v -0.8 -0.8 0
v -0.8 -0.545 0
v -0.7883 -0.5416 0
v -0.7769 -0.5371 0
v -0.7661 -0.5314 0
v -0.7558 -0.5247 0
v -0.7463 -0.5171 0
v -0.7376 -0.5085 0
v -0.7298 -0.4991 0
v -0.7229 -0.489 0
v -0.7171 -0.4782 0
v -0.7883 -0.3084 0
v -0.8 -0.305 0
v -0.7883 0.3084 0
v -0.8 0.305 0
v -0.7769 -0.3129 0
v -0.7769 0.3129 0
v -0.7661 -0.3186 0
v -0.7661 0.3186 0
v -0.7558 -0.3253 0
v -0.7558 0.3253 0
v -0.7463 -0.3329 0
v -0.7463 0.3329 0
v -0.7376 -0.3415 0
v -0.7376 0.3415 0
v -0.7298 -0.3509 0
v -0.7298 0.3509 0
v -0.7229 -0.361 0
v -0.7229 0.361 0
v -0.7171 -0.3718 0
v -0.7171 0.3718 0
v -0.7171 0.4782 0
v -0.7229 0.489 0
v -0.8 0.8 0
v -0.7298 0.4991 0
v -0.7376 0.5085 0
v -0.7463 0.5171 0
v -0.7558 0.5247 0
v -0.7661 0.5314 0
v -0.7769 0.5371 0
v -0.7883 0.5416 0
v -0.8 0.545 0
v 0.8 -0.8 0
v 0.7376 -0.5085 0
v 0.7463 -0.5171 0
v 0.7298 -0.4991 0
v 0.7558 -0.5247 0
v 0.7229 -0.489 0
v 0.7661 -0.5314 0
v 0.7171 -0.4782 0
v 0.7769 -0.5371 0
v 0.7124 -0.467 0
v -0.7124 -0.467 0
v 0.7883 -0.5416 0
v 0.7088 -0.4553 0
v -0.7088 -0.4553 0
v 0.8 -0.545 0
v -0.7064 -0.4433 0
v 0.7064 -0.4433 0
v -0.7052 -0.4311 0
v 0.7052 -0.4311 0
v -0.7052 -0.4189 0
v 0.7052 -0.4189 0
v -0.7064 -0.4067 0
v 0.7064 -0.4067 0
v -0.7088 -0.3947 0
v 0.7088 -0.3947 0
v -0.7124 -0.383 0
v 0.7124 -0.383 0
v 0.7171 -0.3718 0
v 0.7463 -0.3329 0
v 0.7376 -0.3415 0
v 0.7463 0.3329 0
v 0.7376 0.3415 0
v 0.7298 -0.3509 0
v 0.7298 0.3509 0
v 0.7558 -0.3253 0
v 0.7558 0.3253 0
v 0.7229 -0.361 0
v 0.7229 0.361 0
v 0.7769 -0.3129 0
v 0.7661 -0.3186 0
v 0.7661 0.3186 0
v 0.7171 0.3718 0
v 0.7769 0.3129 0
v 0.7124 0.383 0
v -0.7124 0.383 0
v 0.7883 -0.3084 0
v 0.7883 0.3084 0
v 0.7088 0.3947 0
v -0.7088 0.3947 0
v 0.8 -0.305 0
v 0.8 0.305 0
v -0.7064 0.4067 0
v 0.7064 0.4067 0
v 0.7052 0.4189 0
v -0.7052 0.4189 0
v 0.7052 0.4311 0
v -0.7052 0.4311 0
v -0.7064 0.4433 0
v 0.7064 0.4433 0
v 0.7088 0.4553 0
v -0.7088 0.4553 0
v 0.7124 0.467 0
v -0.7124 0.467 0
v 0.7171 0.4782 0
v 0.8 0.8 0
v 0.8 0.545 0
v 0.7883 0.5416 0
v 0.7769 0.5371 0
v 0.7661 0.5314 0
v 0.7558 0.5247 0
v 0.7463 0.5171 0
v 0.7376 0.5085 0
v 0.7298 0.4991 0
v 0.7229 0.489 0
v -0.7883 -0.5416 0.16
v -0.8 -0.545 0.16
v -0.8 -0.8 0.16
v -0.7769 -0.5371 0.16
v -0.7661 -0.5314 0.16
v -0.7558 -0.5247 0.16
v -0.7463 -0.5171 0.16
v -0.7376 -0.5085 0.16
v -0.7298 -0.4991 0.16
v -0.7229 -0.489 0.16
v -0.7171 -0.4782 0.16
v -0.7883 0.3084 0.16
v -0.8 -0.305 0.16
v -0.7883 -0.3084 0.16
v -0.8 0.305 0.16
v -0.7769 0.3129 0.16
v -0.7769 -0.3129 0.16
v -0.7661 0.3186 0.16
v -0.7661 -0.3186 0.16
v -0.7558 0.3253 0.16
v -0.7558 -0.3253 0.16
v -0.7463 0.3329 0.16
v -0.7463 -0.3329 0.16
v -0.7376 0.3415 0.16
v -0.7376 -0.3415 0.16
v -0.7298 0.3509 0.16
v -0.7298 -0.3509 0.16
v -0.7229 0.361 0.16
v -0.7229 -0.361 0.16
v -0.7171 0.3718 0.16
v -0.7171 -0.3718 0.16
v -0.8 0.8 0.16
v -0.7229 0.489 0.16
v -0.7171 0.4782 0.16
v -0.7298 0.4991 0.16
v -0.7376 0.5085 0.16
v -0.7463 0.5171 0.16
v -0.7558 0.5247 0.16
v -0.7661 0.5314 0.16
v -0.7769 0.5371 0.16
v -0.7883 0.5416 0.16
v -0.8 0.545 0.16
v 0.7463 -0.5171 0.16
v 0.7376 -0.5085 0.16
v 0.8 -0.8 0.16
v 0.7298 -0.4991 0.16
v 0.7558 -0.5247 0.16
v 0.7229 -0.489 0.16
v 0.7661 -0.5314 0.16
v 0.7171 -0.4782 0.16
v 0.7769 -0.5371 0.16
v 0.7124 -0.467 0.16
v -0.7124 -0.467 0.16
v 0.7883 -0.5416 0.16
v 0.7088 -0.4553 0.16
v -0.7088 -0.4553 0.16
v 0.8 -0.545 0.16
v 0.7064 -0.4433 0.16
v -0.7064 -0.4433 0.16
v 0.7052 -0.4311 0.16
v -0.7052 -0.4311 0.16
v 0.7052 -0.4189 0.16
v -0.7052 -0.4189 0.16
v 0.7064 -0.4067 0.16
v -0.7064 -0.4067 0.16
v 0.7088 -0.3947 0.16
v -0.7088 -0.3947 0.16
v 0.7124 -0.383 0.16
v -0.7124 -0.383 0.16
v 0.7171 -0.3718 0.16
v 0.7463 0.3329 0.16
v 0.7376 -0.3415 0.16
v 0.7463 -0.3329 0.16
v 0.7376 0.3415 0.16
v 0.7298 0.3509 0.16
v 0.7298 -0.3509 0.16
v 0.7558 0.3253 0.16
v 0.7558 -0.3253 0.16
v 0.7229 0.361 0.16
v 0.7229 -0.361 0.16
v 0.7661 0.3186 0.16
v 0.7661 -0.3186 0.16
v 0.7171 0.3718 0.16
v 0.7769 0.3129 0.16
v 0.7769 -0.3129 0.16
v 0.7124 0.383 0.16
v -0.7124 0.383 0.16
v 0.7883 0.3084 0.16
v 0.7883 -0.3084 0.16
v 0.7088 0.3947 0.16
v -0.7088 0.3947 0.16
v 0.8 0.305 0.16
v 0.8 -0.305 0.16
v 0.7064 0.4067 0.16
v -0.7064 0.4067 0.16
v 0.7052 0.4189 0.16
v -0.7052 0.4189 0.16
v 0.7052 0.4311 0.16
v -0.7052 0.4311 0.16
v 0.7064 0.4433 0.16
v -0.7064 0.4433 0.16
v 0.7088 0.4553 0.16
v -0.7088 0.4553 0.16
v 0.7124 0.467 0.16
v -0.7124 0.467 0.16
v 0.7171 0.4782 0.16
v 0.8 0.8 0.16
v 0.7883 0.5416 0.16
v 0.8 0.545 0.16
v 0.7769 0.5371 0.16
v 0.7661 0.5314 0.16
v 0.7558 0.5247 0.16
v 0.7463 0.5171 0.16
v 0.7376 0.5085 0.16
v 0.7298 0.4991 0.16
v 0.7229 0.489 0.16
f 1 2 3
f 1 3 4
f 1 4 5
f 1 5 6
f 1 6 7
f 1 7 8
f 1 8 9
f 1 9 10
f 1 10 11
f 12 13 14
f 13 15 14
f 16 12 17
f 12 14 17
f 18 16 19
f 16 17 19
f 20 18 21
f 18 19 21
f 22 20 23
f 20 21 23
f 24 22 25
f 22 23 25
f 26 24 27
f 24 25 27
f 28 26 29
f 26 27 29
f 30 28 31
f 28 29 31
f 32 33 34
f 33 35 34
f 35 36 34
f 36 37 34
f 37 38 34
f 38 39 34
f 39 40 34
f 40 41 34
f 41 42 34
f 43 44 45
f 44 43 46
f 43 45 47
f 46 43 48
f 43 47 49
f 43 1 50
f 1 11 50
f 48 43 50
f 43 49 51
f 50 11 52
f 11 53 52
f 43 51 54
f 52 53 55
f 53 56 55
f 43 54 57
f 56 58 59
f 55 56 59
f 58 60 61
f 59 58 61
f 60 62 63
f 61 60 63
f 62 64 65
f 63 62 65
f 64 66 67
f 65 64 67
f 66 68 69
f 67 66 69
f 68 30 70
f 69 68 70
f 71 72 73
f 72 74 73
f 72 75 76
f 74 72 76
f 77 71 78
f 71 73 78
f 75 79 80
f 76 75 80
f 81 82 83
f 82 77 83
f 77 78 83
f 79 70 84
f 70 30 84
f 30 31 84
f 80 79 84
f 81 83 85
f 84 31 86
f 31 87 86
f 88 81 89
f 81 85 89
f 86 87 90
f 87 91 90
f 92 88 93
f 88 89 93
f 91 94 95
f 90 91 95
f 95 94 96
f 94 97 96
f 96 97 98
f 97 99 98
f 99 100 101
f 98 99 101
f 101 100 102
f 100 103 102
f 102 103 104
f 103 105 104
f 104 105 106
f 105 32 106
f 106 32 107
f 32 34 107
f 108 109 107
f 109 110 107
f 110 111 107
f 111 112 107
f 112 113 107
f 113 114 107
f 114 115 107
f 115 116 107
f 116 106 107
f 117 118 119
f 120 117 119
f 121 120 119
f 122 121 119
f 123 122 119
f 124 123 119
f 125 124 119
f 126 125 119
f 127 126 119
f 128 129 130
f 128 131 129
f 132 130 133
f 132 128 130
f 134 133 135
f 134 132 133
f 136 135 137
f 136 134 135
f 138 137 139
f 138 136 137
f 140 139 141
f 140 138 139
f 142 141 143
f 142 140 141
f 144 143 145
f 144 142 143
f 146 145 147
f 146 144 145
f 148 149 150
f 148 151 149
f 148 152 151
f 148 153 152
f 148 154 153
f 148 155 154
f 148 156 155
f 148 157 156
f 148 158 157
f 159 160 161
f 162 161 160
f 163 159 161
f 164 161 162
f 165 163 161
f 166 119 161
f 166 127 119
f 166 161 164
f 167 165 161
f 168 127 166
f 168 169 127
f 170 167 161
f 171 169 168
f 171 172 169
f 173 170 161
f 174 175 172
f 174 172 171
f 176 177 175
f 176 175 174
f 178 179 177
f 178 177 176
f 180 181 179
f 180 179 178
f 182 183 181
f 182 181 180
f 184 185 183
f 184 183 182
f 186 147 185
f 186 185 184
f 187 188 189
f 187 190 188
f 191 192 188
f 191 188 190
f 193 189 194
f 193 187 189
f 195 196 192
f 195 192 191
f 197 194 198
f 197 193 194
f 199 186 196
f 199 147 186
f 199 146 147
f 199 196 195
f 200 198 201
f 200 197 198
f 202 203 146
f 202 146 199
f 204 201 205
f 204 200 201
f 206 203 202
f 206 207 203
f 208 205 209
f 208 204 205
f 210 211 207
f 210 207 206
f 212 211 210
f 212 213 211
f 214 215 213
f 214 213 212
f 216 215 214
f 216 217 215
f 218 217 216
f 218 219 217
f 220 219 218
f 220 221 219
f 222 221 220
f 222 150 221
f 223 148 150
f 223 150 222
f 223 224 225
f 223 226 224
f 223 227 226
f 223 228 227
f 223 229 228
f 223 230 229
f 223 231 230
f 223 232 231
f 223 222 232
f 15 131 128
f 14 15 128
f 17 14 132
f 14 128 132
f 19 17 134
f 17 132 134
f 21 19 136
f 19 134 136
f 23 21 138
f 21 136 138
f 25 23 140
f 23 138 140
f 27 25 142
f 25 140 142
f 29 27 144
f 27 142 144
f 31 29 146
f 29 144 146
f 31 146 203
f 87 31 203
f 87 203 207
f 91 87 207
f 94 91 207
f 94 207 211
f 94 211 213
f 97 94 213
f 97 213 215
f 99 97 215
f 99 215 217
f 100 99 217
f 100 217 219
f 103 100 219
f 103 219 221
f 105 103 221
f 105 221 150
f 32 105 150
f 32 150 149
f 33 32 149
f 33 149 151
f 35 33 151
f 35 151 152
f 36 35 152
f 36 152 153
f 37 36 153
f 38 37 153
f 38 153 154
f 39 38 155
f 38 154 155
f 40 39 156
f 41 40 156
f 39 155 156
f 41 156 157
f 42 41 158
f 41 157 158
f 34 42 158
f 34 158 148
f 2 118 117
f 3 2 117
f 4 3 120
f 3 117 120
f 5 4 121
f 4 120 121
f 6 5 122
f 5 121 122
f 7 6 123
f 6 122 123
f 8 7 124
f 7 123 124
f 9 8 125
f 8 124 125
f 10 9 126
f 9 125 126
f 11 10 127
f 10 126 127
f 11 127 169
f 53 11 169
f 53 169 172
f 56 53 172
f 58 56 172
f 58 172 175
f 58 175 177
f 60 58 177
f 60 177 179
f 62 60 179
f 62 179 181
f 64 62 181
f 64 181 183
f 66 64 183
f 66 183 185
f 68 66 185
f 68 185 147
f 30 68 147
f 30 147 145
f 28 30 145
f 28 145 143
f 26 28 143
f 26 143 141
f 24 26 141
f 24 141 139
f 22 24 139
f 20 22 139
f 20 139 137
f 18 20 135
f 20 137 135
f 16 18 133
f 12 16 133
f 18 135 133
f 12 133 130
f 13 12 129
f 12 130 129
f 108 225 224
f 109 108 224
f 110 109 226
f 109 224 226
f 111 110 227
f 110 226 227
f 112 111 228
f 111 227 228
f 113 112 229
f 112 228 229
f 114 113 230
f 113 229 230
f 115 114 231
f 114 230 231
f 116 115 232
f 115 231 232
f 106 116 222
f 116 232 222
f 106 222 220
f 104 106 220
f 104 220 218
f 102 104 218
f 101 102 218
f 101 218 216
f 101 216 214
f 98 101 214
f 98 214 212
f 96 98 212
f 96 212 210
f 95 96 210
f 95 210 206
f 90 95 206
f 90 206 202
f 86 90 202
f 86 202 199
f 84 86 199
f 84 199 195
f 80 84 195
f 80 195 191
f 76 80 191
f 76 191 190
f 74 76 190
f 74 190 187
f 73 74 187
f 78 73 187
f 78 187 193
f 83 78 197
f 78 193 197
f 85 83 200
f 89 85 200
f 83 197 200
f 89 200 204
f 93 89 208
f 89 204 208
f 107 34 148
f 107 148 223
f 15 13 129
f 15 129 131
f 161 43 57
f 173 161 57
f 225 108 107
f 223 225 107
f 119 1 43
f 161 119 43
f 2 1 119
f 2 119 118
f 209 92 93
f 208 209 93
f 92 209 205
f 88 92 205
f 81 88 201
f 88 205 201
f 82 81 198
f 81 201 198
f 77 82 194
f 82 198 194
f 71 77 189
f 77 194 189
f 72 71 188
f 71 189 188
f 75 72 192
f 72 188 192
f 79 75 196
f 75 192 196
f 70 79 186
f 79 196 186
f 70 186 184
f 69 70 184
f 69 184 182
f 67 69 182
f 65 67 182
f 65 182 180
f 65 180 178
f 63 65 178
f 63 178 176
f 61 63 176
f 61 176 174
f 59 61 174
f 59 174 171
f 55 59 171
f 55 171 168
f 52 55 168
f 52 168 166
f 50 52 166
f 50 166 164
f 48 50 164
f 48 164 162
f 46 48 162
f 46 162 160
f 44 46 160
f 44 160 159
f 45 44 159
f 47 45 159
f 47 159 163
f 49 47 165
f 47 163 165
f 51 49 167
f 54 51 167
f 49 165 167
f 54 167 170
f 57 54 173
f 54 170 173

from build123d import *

# Parameters (mm, degrees)
SKETCH_W     = 1.6
SKETCH_H     = 1.6
PAD_DEPTH    = 0.16
POCKET_DEPTH = 0.161


with BuildPart() as part:
    # Sketch → Pad (new body)
    with BuildSketch(Plane.XY):
        Rectangle(SKETCH_W, SKETCH_H)
    extrude(amount=PAD_DEPTH)

    # Sketch001 (on Face6 of Pad) → Pocket (cut, through all)
    with BuildSketch(Plane.XY.offset(0.16)):
        with BuildLine():
            ThreePointArc((-0.8, 0.305), (-0.705, 0.425), (-0.8, 0.545))
            Line((-0.8, 0.545), (-0.8, 0.305))
        make_face()
        with BuildLine():
            ThreePointArc((0.8, 0.545), (0.705, 0.425), (0.8, 0.305))
            Line((0.8, 0.545), (0.8, 0.305))
        make_face()
        with BuildLine():
            ThreePointArc((-0.8, -0.545), (-0.705, -0.425), (-0.8, -0.305))
            Line((-0.8, -0.305), (-0.8, -0.545))
        make_face()
        with BuildLine():
            ThreePointArc((0.8, -0.305), (0.705, -0.425), (0.8, -0.545))
            Line((0.8, -0.305), (0.8, -0.545))
        make_face()
    extrude(amount=-POCKET_DEPTH, mode=Mode.SUBTRACT)


solid = part.part
